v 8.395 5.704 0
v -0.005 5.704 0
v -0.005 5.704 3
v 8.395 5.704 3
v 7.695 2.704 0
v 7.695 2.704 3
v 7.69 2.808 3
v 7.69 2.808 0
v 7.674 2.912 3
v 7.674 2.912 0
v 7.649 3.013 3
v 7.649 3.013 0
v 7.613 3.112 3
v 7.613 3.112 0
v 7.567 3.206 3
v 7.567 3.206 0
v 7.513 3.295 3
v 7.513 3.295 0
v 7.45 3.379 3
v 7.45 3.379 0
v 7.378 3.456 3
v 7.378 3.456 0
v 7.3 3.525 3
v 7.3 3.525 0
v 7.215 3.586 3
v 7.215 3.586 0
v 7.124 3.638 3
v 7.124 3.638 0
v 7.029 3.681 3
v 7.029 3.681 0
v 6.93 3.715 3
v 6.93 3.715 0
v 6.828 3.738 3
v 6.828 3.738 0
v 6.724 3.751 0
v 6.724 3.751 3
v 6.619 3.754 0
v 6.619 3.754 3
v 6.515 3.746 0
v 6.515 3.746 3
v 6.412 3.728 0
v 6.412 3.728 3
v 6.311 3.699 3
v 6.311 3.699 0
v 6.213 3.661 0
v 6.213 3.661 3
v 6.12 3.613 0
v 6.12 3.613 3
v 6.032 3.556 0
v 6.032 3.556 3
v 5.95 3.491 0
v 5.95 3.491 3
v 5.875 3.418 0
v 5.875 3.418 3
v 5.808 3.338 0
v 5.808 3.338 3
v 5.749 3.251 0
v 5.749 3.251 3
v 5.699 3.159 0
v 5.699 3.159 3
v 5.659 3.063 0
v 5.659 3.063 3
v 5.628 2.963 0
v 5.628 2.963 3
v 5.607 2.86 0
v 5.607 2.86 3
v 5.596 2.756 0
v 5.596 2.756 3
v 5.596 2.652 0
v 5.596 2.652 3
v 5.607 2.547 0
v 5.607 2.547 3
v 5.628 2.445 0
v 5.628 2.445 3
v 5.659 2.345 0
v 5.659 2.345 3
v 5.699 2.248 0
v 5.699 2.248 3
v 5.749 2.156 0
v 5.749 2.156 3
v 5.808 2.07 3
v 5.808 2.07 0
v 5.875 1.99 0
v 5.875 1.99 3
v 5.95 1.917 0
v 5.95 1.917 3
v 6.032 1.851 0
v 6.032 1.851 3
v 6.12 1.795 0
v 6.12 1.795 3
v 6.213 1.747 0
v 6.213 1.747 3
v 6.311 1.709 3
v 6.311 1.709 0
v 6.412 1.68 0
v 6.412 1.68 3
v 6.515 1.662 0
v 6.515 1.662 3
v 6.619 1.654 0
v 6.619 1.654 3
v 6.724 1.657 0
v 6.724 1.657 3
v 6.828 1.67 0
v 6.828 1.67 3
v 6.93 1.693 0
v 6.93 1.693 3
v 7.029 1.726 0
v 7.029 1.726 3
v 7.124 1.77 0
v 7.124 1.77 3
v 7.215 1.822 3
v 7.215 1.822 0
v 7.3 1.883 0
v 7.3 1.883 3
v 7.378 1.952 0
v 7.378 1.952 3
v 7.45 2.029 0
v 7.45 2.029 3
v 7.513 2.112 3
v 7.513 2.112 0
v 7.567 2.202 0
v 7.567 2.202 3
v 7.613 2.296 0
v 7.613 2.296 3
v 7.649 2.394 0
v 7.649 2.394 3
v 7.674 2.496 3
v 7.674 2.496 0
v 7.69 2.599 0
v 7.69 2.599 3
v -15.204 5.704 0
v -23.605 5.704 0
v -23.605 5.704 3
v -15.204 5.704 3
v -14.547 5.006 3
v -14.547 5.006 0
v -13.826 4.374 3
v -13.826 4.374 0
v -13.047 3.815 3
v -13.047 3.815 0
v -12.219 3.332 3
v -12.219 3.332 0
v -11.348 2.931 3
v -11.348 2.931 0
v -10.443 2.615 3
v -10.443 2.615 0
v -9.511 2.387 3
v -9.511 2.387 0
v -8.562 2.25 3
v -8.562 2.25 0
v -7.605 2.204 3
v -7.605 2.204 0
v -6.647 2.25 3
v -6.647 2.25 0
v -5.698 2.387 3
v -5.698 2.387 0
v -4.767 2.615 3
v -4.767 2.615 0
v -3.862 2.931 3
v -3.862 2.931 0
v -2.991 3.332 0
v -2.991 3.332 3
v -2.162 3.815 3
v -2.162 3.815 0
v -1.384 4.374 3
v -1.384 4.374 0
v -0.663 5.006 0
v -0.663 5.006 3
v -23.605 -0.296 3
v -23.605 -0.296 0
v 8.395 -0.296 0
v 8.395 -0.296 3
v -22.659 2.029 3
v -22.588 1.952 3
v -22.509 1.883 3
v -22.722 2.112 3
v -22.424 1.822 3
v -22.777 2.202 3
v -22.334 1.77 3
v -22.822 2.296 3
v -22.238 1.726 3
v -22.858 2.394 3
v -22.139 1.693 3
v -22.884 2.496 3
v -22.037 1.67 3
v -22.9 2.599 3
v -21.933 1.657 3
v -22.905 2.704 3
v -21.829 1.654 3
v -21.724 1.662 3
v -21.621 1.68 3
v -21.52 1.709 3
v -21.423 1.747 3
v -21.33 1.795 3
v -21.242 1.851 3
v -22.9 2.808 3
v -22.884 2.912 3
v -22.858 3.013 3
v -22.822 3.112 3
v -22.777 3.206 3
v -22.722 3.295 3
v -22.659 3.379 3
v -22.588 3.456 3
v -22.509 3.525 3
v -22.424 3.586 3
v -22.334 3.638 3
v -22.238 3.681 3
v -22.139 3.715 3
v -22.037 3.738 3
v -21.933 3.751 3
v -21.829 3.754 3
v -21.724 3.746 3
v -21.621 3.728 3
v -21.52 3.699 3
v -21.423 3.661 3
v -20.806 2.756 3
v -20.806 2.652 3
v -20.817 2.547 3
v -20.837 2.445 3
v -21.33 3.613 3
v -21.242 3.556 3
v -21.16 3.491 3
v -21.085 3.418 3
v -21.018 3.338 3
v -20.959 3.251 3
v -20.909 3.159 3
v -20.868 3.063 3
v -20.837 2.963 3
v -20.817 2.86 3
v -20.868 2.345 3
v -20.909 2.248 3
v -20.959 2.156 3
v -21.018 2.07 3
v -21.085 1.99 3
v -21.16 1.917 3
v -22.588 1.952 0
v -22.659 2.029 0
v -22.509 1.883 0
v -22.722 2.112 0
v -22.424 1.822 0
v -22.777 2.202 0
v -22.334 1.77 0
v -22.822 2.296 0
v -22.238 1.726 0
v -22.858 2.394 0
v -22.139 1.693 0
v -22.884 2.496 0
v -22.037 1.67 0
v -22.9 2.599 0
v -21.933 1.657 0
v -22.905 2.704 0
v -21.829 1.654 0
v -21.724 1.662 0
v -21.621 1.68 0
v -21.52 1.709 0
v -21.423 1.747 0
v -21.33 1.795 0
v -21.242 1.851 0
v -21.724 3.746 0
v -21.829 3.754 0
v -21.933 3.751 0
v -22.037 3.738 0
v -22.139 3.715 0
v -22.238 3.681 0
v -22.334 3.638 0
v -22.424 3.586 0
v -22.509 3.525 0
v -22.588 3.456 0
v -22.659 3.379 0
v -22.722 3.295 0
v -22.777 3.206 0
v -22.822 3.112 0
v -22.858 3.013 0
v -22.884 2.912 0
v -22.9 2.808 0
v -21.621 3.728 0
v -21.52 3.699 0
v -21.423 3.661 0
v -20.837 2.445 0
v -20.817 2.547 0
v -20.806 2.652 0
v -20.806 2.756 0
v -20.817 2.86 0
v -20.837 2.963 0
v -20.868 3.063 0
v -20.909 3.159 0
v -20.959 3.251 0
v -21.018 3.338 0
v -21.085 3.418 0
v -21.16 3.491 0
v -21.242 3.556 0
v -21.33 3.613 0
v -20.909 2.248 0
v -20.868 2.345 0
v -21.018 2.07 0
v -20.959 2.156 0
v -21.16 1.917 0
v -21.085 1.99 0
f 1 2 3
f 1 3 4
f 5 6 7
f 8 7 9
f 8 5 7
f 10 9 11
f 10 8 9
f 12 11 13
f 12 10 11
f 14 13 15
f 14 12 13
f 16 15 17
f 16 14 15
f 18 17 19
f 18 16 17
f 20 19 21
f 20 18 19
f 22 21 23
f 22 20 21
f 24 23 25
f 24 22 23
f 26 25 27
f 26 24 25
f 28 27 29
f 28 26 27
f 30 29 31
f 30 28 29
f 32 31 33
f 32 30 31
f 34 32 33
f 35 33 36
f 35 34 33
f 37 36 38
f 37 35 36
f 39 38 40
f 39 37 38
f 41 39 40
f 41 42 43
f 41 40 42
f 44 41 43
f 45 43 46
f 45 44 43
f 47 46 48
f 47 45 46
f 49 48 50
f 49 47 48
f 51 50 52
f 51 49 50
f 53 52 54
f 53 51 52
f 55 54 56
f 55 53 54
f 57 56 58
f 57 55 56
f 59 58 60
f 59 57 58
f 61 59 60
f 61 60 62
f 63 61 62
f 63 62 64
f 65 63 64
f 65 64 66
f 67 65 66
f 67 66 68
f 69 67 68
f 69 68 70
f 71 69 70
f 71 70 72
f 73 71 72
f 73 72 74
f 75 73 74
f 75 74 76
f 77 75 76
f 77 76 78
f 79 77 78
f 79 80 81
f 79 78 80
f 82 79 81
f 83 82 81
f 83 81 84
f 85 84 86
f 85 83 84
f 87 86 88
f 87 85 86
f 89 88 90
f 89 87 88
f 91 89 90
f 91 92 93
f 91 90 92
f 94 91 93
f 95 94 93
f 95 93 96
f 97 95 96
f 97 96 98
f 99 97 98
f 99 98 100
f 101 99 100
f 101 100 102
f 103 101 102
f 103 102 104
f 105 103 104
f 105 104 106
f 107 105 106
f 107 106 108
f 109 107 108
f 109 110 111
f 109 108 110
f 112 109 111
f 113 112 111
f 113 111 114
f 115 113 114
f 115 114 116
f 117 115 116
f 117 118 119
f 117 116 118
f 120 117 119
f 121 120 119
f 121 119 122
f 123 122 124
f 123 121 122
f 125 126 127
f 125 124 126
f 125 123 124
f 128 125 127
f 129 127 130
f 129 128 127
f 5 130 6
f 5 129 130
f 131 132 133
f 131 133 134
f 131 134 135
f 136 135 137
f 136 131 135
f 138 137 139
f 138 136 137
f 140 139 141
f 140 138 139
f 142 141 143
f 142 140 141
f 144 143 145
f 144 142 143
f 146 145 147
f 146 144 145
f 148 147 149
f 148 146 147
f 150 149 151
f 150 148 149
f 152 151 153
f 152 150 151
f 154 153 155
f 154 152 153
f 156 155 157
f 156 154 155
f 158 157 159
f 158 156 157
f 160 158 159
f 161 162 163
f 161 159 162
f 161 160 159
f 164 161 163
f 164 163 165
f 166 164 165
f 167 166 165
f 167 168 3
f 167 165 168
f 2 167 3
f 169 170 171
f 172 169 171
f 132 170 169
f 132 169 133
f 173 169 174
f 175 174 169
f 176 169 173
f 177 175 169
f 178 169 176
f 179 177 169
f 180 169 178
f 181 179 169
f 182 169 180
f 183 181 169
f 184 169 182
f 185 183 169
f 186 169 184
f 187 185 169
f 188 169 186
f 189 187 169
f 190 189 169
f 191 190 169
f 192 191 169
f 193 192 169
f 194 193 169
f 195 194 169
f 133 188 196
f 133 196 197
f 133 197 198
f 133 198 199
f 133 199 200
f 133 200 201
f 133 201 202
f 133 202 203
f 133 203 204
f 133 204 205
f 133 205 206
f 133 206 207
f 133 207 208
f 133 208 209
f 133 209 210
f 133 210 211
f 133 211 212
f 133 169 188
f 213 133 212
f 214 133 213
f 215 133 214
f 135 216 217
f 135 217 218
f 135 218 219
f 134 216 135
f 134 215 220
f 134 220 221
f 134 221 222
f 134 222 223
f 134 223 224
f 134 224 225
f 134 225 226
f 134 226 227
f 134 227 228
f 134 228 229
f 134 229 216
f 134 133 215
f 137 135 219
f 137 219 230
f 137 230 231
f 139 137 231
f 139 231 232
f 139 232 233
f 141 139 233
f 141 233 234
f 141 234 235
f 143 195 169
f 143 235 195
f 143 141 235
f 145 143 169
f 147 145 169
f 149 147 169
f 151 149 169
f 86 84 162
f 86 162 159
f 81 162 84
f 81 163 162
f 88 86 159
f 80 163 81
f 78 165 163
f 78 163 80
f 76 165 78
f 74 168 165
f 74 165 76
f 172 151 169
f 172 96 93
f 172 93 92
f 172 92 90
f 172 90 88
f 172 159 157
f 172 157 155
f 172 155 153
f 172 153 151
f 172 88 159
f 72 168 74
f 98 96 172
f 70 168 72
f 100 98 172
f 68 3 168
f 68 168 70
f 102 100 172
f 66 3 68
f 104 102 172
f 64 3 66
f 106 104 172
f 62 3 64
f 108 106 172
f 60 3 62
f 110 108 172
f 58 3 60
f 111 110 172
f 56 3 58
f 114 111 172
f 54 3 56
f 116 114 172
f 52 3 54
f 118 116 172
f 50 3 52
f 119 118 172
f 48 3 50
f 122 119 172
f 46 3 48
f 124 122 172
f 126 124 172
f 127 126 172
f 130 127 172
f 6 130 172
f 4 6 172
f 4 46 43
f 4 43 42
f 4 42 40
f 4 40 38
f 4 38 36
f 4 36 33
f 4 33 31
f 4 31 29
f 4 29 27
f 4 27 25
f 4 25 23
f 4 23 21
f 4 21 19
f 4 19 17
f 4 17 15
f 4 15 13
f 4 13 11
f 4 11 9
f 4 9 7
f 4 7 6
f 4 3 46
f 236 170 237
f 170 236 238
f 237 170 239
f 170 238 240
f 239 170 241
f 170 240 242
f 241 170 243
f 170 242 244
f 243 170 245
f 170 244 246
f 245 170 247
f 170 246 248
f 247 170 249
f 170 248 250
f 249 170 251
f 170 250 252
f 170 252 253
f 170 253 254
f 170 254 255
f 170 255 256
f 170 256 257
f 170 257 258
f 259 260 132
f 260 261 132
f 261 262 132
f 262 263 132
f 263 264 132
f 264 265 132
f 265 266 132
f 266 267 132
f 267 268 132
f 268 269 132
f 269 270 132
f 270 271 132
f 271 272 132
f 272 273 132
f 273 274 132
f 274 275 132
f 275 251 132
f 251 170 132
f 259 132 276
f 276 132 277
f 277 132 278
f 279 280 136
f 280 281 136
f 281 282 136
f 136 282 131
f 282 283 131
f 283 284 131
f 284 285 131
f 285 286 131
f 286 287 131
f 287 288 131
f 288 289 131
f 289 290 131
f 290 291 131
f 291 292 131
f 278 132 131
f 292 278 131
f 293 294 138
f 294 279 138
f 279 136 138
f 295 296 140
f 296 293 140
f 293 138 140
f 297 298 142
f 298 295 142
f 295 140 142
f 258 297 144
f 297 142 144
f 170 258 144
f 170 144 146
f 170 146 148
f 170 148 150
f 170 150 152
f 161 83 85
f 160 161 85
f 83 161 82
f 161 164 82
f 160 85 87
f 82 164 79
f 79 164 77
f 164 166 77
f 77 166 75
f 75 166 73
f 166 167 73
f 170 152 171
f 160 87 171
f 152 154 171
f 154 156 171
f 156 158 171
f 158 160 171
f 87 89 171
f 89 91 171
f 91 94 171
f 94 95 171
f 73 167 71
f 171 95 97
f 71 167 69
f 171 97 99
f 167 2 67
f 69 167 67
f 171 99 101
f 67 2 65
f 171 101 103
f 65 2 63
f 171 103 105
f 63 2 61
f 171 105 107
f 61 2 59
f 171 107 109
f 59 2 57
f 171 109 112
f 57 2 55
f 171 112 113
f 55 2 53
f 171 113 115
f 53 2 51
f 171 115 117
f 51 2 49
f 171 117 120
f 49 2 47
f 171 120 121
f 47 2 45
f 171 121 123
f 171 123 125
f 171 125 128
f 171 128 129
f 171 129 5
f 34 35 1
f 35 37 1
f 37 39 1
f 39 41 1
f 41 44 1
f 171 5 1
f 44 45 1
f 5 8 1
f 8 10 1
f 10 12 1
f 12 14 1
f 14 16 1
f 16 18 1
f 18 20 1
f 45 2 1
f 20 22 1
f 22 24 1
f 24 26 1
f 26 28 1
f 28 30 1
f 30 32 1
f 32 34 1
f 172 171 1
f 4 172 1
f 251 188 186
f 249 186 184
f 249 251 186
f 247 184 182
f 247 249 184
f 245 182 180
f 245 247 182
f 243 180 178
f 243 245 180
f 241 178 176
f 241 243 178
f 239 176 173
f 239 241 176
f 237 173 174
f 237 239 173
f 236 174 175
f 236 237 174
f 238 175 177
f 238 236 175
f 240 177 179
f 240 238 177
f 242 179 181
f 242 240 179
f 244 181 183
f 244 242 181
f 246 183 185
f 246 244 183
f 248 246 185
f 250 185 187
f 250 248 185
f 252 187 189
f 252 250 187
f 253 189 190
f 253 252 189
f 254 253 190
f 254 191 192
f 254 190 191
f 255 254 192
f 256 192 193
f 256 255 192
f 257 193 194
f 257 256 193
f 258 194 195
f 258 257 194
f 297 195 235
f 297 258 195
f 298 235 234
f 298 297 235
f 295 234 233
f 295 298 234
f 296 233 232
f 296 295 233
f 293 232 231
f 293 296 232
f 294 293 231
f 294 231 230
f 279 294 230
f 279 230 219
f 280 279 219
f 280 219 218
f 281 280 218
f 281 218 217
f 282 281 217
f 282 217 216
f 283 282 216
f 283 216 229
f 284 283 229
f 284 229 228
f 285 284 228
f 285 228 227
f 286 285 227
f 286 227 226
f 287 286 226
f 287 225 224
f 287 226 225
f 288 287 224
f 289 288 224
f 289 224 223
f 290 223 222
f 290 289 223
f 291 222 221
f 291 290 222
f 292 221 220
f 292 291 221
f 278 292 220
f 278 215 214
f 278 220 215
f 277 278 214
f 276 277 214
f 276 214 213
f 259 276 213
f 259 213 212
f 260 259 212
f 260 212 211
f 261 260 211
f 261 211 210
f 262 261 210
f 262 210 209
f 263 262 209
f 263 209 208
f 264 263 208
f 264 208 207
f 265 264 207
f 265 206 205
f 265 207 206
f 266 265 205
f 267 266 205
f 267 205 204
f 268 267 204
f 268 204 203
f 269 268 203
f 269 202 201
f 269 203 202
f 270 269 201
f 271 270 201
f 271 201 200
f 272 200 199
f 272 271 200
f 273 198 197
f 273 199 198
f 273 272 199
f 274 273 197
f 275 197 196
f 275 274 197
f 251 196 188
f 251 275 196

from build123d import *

# Parameters (mm, degrees)
ESQUISSE1_W             = 32
ESQUISSE1_H             = 6
BOSS_EXTRU_1_DEPTH      = 3
ESQUISSE1_3_R           = 1.05
ENL_V_MAT_EXTRU_1_DEPTH = 19


with BuildPart() as part:
    # Esquisse1 → Boss.-Extru.1 (new body)
    with BuildSketch(Plane.XY):
        with Locations((-7.60481861, 2.703893443)):
            Rectangle(ESQUISSE1_W, ESQUISSE1_H)
    extrude(amount=BOSS_EXTRU_1_DEPTH)

    # Esquisse1<3> → Enlèv. mat.-Extru.1 (cut)
    with BuildSketch(Plane.XY):
        with BuildLine():
            Line((-0.005476534, 5.703893443), (-15.204160687, 5.703893443))
            ThreePointArc((-15.204160687, 5.703893443), (-7.60481861, 2.203893443), (-0.005476534, 5.703893443))
        make_face()
        with Locations((6.64518139, 2.703893443)):
            Circle(ESQUISSE1_3_R)
        with Locations((-21.85481861, 2.703893443)):
            Circle(ESQUISSE1_3_R)
    extrude(amount=ENL_V_MAT_EXTRU_1_DEPTH, mode=Mode.SUBTRACT)


solid = part.part
